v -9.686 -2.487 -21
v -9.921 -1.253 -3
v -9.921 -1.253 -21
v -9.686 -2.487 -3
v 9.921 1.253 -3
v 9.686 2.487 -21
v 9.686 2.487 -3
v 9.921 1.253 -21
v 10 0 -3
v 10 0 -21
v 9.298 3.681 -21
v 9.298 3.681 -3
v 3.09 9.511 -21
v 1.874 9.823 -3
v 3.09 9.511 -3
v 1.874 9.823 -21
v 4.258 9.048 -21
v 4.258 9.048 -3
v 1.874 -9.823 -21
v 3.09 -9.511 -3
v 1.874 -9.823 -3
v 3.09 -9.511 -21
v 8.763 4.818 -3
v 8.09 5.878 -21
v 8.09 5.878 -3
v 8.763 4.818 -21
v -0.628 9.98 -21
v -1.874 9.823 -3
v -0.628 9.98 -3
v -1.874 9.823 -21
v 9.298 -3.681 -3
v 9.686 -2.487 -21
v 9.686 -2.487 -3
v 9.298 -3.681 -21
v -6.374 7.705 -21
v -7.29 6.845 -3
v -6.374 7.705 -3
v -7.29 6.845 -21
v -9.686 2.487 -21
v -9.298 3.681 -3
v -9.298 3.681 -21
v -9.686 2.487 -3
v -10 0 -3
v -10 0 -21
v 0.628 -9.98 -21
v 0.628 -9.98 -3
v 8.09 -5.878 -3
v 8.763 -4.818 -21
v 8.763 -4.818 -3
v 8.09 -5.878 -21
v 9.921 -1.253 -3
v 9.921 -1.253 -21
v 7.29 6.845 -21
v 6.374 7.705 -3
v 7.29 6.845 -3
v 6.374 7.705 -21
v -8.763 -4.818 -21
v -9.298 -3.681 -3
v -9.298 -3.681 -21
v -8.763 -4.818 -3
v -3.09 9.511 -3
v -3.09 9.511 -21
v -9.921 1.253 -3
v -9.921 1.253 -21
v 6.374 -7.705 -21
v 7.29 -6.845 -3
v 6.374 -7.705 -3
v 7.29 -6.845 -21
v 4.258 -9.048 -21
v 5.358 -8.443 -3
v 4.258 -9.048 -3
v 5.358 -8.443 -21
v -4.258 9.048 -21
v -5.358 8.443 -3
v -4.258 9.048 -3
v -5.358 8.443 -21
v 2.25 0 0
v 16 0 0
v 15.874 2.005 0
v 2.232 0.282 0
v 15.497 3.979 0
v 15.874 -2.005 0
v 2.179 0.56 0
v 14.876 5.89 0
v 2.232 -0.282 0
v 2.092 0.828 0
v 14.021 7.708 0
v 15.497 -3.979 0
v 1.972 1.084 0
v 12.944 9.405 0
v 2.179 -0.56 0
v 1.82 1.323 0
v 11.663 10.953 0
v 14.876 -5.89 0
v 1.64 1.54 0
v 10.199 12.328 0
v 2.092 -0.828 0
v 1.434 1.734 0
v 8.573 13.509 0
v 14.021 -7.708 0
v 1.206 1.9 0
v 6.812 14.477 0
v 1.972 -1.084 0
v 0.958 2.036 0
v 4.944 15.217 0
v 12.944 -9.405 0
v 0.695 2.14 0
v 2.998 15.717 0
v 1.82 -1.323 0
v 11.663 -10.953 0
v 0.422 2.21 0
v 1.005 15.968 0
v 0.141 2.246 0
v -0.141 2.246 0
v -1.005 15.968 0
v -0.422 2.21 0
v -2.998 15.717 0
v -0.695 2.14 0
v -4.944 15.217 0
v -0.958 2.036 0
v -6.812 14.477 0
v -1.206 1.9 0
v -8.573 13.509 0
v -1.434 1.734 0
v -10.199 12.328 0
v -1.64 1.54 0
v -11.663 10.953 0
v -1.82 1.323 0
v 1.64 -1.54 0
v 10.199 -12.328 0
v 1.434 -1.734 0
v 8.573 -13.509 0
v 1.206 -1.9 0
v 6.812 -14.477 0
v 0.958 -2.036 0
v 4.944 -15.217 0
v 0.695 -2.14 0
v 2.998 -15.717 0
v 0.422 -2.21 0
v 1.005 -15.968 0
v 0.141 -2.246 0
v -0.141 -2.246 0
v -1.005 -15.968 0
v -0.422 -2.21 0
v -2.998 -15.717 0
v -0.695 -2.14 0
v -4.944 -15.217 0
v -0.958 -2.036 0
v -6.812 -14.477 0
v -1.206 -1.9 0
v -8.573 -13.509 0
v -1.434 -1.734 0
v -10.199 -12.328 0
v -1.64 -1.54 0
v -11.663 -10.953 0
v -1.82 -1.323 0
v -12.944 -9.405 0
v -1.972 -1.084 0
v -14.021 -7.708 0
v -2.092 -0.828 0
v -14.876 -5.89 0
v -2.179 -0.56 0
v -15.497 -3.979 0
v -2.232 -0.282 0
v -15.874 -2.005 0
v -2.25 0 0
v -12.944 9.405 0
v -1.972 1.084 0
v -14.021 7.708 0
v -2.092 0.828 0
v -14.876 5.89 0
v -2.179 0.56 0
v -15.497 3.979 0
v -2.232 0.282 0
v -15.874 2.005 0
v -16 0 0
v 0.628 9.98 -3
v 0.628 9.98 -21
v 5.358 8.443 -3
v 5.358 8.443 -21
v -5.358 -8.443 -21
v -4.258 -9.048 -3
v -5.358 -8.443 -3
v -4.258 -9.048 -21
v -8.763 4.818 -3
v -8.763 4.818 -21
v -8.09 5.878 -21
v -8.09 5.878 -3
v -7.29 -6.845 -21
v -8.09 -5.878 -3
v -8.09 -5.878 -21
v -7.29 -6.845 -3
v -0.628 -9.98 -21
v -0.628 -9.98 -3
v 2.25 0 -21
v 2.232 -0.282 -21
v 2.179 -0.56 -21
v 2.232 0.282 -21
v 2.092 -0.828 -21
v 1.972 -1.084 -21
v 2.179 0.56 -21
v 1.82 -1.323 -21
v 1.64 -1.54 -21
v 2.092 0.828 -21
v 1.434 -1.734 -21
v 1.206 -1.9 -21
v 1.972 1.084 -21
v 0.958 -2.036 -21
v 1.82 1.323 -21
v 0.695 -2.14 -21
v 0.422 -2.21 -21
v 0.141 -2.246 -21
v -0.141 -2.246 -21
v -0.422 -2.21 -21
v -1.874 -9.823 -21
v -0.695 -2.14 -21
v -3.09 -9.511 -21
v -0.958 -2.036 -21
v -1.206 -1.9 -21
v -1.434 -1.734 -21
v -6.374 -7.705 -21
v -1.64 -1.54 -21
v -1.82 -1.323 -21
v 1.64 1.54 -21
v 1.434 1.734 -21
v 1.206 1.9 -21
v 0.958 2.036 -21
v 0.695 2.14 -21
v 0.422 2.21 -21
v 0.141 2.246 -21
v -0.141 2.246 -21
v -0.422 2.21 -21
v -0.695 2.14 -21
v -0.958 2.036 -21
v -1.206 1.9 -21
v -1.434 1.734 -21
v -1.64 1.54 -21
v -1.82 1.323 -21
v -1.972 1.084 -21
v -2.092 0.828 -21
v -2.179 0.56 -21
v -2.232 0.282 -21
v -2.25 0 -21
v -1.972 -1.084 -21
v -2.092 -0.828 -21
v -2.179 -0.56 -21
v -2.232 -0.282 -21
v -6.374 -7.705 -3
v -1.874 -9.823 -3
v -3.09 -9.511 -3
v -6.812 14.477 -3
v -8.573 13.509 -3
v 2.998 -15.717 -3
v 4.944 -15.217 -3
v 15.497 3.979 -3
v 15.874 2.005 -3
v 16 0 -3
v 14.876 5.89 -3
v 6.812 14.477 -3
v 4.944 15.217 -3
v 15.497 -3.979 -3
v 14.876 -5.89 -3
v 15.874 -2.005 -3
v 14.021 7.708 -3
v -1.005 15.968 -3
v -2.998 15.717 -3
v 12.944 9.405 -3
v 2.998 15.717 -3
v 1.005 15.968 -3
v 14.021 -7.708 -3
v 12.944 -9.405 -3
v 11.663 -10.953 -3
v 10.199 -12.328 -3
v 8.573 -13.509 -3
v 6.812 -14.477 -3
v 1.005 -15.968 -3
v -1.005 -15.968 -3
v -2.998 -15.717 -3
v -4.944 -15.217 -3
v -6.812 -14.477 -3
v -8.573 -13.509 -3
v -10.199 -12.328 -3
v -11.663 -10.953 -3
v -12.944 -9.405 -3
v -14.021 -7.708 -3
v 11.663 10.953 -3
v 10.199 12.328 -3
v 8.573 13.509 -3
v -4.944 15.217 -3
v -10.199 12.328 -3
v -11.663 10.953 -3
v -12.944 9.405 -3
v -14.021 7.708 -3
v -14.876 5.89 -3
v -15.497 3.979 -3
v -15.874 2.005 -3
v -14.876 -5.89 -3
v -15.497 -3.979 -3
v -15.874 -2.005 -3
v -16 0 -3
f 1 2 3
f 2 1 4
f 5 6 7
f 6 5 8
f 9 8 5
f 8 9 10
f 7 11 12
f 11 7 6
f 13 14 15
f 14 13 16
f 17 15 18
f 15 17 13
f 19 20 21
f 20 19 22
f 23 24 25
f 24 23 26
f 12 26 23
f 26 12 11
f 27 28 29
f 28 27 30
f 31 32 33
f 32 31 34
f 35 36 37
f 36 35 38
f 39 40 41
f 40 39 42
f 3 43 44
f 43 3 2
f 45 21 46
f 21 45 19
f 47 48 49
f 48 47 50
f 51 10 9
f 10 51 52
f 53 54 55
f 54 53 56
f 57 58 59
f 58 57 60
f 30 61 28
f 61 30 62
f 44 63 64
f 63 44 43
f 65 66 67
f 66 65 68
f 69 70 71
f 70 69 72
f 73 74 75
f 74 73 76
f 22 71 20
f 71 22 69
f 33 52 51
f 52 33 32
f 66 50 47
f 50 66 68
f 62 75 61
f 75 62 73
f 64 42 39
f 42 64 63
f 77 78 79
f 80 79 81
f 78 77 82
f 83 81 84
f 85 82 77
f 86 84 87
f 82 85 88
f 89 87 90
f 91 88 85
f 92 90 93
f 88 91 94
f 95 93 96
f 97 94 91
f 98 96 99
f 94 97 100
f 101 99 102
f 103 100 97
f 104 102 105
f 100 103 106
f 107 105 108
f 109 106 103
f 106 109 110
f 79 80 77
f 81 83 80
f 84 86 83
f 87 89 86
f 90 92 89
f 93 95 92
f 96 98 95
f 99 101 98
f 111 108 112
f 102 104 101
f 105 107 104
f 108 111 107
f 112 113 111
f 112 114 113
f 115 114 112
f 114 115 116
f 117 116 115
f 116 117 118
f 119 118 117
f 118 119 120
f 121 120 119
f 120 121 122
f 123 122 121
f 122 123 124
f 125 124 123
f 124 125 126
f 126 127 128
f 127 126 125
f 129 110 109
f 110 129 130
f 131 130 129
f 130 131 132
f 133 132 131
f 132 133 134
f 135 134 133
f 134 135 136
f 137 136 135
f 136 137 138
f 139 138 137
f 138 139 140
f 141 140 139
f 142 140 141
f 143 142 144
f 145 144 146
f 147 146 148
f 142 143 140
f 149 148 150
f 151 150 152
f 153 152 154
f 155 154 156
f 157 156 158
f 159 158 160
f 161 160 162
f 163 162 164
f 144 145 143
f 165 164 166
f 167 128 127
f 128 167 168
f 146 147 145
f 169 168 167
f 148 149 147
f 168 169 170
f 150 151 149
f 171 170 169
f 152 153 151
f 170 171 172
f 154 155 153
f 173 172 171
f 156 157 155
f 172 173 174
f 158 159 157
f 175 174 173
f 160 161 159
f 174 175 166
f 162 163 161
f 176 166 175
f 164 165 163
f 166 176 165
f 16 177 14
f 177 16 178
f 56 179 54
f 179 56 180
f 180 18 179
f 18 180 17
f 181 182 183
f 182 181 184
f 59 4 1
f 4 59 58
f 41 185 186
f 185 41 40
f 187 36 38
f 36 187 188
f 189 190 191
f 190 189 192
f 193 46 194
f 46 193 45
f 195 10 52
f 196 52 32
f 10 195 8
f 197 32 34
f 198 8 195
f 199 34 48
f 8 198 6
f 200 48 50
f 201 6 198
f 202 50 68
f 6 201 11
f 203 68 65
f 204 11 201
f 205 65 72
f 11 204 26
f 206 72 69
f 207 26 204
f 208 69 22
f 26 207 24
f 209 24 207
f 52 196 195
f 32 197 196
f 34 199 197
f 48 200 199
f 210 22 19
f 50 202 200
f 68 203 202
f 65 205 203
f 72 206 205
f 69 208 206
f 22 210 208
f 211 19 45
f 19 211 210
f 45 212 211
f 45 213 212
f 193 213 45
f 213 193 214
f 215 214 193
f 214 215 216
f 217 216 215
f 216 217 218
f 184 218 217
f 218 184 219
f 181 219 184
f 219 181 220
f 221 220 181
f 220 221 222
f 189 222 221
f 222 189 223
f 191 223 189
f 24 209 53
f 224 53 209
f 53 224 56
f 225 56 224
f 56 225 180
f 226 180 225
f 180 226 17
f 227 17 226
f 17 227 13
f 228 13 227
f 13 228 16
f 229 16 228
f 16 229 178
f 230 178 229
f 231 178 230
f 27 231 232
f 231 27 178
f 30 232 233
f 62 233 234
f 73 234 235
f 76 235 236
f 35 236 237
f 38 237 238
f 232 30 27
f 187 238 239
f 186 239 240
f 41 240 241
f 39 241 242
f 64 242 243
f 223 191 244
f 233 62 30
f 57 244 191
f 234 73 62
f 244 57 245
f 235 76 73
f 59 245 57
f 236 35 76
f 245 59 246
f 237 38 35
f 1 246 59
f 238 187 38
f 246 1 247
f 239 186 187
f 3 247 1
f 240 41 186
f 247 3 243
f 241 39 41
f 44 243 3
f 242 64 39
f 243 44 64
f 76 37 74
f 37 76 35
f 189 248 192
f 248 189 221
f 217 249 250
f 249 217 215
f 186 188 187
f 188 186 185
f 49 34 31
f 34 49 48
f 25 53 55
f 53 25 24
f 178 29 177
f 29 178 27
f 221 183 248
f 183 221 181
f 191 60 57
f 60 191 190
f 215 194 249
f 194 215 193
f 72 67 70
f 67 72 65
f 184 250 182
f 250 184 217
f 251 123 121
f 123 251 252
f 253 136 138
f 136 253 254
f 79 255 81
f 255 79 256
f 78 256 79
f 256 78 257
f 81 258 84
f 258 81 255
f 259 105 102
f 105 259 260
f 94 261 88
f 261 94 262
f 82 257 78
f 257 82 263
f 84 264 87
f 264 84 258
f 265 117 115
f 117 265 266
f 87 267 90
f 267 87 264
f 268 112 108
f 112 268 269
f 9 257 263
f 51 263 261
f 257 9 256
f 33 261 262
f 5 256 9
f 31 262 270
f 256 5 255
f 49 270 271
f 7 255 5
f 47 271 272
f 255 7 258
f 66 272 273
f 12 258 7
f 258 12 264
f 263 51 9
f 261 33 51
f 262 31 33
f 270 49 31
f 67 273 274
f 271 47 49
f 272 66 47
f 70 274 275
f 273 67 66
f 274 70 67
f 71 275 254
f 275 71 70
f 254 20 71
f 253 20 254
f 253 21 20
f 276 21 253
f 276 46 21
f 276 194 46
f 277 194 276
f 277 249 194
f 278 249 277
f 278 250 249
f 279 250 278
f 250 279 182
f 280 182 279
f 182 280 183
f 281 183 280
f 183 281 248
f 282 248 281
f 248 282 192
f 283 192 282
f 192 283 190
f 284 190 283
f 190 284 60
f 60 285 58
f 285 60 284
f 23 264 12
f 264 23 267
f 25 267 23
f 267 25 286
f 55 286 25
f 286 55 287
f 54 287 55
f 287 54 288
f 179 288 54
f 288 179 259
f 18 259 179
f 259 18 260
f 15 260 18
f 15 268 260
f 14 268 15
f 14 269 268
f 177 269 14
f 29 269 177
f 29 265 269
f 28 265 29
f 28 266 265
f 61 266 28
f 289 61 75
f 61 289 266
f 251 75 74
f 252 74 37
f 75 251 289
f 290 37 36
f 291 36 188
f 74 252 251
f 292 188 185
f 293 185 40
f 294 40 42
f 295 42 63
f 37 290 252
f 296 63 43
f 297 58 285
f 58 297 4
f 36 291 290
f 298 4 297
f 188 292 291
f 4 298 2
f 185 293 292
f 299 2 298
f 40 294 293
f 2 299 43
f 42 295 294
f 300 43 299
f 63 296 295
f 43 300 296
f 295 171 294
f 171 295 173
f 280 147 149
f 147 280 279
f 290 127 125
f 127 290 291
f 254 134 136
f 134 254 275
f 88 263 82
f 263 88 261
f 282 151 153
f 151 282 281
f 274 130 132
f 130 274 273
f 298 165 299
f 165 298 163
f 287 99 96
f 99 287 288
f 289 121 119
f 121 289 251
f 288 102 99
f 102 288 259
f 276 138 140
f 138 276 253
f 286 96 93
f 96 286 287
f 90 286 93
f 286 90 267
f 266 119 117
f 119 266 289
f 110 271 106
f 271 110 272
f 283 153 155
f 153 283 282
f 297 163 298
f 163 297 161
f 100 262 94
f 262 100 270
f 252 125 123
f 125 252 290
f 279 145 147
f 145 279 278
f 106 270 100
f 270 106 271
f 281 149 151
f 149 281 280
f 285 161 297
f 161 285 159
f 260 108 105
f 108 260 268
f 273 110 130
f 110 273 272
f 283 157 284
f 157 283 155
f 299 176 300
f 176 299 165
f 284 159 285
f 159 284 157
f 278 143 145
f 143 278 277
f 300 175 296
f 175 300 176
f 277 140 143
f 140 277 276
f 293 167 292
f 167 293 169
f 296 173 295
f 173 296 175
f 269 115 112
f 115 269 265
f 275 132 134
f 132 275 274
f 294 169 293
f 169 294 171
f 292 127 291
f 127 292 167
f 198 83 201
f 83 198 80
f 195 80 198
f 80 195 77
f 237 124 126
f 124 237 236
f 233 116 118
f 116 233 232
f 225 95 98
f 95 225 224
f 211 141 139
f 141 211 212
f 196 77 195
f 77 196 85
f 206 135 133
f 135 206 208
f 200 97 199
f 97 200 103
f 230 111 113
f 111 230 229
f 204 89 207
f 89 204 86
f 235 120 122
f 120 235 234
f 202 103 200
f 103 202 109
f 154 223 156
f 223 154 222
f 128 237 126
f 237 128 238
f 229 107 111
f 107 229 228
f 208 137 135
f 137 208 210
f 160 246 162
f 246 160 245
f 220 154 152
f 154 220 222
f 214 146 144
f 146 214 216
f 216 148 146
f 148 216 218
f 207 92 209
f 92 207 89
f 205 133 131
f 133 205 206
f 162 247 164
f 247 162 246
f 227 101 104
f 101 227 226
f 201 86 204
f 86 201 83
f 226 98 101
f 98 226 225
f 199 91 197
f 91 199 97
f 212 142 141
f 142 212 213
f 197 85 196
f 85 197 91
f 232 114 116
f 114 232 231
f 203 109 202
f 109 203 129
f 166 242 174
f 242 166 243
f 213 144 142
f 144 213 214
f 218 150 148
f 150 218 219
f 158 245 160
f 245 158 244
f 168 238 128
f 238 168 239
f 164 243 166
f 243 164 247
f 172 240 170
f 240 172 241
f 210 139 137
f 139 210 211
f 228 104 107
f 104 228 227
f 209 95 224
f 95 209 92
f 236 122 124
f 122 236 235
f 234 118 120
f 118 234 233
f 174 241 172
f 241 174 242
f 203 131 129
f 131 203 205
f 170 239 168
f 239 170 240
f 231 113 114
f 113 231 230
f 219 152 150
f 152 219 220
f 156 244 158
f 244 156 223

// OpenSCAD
$fn = 50;


difference() {
	union() {
		translate(v = [0, 0, -21.0000000000]) {
			cylinder(h = 21, r = 10.0000000000);
		}
		translate(v = [0, 0, -3.0000000000]) {
			cylinder(h = 3, r = 16.0000000000);
		}
	}
	union() {
		#translate(v = [0, 0, -21]) {
			cylinder(h = 21, r = 2.2500000000);
		}
	}
}
